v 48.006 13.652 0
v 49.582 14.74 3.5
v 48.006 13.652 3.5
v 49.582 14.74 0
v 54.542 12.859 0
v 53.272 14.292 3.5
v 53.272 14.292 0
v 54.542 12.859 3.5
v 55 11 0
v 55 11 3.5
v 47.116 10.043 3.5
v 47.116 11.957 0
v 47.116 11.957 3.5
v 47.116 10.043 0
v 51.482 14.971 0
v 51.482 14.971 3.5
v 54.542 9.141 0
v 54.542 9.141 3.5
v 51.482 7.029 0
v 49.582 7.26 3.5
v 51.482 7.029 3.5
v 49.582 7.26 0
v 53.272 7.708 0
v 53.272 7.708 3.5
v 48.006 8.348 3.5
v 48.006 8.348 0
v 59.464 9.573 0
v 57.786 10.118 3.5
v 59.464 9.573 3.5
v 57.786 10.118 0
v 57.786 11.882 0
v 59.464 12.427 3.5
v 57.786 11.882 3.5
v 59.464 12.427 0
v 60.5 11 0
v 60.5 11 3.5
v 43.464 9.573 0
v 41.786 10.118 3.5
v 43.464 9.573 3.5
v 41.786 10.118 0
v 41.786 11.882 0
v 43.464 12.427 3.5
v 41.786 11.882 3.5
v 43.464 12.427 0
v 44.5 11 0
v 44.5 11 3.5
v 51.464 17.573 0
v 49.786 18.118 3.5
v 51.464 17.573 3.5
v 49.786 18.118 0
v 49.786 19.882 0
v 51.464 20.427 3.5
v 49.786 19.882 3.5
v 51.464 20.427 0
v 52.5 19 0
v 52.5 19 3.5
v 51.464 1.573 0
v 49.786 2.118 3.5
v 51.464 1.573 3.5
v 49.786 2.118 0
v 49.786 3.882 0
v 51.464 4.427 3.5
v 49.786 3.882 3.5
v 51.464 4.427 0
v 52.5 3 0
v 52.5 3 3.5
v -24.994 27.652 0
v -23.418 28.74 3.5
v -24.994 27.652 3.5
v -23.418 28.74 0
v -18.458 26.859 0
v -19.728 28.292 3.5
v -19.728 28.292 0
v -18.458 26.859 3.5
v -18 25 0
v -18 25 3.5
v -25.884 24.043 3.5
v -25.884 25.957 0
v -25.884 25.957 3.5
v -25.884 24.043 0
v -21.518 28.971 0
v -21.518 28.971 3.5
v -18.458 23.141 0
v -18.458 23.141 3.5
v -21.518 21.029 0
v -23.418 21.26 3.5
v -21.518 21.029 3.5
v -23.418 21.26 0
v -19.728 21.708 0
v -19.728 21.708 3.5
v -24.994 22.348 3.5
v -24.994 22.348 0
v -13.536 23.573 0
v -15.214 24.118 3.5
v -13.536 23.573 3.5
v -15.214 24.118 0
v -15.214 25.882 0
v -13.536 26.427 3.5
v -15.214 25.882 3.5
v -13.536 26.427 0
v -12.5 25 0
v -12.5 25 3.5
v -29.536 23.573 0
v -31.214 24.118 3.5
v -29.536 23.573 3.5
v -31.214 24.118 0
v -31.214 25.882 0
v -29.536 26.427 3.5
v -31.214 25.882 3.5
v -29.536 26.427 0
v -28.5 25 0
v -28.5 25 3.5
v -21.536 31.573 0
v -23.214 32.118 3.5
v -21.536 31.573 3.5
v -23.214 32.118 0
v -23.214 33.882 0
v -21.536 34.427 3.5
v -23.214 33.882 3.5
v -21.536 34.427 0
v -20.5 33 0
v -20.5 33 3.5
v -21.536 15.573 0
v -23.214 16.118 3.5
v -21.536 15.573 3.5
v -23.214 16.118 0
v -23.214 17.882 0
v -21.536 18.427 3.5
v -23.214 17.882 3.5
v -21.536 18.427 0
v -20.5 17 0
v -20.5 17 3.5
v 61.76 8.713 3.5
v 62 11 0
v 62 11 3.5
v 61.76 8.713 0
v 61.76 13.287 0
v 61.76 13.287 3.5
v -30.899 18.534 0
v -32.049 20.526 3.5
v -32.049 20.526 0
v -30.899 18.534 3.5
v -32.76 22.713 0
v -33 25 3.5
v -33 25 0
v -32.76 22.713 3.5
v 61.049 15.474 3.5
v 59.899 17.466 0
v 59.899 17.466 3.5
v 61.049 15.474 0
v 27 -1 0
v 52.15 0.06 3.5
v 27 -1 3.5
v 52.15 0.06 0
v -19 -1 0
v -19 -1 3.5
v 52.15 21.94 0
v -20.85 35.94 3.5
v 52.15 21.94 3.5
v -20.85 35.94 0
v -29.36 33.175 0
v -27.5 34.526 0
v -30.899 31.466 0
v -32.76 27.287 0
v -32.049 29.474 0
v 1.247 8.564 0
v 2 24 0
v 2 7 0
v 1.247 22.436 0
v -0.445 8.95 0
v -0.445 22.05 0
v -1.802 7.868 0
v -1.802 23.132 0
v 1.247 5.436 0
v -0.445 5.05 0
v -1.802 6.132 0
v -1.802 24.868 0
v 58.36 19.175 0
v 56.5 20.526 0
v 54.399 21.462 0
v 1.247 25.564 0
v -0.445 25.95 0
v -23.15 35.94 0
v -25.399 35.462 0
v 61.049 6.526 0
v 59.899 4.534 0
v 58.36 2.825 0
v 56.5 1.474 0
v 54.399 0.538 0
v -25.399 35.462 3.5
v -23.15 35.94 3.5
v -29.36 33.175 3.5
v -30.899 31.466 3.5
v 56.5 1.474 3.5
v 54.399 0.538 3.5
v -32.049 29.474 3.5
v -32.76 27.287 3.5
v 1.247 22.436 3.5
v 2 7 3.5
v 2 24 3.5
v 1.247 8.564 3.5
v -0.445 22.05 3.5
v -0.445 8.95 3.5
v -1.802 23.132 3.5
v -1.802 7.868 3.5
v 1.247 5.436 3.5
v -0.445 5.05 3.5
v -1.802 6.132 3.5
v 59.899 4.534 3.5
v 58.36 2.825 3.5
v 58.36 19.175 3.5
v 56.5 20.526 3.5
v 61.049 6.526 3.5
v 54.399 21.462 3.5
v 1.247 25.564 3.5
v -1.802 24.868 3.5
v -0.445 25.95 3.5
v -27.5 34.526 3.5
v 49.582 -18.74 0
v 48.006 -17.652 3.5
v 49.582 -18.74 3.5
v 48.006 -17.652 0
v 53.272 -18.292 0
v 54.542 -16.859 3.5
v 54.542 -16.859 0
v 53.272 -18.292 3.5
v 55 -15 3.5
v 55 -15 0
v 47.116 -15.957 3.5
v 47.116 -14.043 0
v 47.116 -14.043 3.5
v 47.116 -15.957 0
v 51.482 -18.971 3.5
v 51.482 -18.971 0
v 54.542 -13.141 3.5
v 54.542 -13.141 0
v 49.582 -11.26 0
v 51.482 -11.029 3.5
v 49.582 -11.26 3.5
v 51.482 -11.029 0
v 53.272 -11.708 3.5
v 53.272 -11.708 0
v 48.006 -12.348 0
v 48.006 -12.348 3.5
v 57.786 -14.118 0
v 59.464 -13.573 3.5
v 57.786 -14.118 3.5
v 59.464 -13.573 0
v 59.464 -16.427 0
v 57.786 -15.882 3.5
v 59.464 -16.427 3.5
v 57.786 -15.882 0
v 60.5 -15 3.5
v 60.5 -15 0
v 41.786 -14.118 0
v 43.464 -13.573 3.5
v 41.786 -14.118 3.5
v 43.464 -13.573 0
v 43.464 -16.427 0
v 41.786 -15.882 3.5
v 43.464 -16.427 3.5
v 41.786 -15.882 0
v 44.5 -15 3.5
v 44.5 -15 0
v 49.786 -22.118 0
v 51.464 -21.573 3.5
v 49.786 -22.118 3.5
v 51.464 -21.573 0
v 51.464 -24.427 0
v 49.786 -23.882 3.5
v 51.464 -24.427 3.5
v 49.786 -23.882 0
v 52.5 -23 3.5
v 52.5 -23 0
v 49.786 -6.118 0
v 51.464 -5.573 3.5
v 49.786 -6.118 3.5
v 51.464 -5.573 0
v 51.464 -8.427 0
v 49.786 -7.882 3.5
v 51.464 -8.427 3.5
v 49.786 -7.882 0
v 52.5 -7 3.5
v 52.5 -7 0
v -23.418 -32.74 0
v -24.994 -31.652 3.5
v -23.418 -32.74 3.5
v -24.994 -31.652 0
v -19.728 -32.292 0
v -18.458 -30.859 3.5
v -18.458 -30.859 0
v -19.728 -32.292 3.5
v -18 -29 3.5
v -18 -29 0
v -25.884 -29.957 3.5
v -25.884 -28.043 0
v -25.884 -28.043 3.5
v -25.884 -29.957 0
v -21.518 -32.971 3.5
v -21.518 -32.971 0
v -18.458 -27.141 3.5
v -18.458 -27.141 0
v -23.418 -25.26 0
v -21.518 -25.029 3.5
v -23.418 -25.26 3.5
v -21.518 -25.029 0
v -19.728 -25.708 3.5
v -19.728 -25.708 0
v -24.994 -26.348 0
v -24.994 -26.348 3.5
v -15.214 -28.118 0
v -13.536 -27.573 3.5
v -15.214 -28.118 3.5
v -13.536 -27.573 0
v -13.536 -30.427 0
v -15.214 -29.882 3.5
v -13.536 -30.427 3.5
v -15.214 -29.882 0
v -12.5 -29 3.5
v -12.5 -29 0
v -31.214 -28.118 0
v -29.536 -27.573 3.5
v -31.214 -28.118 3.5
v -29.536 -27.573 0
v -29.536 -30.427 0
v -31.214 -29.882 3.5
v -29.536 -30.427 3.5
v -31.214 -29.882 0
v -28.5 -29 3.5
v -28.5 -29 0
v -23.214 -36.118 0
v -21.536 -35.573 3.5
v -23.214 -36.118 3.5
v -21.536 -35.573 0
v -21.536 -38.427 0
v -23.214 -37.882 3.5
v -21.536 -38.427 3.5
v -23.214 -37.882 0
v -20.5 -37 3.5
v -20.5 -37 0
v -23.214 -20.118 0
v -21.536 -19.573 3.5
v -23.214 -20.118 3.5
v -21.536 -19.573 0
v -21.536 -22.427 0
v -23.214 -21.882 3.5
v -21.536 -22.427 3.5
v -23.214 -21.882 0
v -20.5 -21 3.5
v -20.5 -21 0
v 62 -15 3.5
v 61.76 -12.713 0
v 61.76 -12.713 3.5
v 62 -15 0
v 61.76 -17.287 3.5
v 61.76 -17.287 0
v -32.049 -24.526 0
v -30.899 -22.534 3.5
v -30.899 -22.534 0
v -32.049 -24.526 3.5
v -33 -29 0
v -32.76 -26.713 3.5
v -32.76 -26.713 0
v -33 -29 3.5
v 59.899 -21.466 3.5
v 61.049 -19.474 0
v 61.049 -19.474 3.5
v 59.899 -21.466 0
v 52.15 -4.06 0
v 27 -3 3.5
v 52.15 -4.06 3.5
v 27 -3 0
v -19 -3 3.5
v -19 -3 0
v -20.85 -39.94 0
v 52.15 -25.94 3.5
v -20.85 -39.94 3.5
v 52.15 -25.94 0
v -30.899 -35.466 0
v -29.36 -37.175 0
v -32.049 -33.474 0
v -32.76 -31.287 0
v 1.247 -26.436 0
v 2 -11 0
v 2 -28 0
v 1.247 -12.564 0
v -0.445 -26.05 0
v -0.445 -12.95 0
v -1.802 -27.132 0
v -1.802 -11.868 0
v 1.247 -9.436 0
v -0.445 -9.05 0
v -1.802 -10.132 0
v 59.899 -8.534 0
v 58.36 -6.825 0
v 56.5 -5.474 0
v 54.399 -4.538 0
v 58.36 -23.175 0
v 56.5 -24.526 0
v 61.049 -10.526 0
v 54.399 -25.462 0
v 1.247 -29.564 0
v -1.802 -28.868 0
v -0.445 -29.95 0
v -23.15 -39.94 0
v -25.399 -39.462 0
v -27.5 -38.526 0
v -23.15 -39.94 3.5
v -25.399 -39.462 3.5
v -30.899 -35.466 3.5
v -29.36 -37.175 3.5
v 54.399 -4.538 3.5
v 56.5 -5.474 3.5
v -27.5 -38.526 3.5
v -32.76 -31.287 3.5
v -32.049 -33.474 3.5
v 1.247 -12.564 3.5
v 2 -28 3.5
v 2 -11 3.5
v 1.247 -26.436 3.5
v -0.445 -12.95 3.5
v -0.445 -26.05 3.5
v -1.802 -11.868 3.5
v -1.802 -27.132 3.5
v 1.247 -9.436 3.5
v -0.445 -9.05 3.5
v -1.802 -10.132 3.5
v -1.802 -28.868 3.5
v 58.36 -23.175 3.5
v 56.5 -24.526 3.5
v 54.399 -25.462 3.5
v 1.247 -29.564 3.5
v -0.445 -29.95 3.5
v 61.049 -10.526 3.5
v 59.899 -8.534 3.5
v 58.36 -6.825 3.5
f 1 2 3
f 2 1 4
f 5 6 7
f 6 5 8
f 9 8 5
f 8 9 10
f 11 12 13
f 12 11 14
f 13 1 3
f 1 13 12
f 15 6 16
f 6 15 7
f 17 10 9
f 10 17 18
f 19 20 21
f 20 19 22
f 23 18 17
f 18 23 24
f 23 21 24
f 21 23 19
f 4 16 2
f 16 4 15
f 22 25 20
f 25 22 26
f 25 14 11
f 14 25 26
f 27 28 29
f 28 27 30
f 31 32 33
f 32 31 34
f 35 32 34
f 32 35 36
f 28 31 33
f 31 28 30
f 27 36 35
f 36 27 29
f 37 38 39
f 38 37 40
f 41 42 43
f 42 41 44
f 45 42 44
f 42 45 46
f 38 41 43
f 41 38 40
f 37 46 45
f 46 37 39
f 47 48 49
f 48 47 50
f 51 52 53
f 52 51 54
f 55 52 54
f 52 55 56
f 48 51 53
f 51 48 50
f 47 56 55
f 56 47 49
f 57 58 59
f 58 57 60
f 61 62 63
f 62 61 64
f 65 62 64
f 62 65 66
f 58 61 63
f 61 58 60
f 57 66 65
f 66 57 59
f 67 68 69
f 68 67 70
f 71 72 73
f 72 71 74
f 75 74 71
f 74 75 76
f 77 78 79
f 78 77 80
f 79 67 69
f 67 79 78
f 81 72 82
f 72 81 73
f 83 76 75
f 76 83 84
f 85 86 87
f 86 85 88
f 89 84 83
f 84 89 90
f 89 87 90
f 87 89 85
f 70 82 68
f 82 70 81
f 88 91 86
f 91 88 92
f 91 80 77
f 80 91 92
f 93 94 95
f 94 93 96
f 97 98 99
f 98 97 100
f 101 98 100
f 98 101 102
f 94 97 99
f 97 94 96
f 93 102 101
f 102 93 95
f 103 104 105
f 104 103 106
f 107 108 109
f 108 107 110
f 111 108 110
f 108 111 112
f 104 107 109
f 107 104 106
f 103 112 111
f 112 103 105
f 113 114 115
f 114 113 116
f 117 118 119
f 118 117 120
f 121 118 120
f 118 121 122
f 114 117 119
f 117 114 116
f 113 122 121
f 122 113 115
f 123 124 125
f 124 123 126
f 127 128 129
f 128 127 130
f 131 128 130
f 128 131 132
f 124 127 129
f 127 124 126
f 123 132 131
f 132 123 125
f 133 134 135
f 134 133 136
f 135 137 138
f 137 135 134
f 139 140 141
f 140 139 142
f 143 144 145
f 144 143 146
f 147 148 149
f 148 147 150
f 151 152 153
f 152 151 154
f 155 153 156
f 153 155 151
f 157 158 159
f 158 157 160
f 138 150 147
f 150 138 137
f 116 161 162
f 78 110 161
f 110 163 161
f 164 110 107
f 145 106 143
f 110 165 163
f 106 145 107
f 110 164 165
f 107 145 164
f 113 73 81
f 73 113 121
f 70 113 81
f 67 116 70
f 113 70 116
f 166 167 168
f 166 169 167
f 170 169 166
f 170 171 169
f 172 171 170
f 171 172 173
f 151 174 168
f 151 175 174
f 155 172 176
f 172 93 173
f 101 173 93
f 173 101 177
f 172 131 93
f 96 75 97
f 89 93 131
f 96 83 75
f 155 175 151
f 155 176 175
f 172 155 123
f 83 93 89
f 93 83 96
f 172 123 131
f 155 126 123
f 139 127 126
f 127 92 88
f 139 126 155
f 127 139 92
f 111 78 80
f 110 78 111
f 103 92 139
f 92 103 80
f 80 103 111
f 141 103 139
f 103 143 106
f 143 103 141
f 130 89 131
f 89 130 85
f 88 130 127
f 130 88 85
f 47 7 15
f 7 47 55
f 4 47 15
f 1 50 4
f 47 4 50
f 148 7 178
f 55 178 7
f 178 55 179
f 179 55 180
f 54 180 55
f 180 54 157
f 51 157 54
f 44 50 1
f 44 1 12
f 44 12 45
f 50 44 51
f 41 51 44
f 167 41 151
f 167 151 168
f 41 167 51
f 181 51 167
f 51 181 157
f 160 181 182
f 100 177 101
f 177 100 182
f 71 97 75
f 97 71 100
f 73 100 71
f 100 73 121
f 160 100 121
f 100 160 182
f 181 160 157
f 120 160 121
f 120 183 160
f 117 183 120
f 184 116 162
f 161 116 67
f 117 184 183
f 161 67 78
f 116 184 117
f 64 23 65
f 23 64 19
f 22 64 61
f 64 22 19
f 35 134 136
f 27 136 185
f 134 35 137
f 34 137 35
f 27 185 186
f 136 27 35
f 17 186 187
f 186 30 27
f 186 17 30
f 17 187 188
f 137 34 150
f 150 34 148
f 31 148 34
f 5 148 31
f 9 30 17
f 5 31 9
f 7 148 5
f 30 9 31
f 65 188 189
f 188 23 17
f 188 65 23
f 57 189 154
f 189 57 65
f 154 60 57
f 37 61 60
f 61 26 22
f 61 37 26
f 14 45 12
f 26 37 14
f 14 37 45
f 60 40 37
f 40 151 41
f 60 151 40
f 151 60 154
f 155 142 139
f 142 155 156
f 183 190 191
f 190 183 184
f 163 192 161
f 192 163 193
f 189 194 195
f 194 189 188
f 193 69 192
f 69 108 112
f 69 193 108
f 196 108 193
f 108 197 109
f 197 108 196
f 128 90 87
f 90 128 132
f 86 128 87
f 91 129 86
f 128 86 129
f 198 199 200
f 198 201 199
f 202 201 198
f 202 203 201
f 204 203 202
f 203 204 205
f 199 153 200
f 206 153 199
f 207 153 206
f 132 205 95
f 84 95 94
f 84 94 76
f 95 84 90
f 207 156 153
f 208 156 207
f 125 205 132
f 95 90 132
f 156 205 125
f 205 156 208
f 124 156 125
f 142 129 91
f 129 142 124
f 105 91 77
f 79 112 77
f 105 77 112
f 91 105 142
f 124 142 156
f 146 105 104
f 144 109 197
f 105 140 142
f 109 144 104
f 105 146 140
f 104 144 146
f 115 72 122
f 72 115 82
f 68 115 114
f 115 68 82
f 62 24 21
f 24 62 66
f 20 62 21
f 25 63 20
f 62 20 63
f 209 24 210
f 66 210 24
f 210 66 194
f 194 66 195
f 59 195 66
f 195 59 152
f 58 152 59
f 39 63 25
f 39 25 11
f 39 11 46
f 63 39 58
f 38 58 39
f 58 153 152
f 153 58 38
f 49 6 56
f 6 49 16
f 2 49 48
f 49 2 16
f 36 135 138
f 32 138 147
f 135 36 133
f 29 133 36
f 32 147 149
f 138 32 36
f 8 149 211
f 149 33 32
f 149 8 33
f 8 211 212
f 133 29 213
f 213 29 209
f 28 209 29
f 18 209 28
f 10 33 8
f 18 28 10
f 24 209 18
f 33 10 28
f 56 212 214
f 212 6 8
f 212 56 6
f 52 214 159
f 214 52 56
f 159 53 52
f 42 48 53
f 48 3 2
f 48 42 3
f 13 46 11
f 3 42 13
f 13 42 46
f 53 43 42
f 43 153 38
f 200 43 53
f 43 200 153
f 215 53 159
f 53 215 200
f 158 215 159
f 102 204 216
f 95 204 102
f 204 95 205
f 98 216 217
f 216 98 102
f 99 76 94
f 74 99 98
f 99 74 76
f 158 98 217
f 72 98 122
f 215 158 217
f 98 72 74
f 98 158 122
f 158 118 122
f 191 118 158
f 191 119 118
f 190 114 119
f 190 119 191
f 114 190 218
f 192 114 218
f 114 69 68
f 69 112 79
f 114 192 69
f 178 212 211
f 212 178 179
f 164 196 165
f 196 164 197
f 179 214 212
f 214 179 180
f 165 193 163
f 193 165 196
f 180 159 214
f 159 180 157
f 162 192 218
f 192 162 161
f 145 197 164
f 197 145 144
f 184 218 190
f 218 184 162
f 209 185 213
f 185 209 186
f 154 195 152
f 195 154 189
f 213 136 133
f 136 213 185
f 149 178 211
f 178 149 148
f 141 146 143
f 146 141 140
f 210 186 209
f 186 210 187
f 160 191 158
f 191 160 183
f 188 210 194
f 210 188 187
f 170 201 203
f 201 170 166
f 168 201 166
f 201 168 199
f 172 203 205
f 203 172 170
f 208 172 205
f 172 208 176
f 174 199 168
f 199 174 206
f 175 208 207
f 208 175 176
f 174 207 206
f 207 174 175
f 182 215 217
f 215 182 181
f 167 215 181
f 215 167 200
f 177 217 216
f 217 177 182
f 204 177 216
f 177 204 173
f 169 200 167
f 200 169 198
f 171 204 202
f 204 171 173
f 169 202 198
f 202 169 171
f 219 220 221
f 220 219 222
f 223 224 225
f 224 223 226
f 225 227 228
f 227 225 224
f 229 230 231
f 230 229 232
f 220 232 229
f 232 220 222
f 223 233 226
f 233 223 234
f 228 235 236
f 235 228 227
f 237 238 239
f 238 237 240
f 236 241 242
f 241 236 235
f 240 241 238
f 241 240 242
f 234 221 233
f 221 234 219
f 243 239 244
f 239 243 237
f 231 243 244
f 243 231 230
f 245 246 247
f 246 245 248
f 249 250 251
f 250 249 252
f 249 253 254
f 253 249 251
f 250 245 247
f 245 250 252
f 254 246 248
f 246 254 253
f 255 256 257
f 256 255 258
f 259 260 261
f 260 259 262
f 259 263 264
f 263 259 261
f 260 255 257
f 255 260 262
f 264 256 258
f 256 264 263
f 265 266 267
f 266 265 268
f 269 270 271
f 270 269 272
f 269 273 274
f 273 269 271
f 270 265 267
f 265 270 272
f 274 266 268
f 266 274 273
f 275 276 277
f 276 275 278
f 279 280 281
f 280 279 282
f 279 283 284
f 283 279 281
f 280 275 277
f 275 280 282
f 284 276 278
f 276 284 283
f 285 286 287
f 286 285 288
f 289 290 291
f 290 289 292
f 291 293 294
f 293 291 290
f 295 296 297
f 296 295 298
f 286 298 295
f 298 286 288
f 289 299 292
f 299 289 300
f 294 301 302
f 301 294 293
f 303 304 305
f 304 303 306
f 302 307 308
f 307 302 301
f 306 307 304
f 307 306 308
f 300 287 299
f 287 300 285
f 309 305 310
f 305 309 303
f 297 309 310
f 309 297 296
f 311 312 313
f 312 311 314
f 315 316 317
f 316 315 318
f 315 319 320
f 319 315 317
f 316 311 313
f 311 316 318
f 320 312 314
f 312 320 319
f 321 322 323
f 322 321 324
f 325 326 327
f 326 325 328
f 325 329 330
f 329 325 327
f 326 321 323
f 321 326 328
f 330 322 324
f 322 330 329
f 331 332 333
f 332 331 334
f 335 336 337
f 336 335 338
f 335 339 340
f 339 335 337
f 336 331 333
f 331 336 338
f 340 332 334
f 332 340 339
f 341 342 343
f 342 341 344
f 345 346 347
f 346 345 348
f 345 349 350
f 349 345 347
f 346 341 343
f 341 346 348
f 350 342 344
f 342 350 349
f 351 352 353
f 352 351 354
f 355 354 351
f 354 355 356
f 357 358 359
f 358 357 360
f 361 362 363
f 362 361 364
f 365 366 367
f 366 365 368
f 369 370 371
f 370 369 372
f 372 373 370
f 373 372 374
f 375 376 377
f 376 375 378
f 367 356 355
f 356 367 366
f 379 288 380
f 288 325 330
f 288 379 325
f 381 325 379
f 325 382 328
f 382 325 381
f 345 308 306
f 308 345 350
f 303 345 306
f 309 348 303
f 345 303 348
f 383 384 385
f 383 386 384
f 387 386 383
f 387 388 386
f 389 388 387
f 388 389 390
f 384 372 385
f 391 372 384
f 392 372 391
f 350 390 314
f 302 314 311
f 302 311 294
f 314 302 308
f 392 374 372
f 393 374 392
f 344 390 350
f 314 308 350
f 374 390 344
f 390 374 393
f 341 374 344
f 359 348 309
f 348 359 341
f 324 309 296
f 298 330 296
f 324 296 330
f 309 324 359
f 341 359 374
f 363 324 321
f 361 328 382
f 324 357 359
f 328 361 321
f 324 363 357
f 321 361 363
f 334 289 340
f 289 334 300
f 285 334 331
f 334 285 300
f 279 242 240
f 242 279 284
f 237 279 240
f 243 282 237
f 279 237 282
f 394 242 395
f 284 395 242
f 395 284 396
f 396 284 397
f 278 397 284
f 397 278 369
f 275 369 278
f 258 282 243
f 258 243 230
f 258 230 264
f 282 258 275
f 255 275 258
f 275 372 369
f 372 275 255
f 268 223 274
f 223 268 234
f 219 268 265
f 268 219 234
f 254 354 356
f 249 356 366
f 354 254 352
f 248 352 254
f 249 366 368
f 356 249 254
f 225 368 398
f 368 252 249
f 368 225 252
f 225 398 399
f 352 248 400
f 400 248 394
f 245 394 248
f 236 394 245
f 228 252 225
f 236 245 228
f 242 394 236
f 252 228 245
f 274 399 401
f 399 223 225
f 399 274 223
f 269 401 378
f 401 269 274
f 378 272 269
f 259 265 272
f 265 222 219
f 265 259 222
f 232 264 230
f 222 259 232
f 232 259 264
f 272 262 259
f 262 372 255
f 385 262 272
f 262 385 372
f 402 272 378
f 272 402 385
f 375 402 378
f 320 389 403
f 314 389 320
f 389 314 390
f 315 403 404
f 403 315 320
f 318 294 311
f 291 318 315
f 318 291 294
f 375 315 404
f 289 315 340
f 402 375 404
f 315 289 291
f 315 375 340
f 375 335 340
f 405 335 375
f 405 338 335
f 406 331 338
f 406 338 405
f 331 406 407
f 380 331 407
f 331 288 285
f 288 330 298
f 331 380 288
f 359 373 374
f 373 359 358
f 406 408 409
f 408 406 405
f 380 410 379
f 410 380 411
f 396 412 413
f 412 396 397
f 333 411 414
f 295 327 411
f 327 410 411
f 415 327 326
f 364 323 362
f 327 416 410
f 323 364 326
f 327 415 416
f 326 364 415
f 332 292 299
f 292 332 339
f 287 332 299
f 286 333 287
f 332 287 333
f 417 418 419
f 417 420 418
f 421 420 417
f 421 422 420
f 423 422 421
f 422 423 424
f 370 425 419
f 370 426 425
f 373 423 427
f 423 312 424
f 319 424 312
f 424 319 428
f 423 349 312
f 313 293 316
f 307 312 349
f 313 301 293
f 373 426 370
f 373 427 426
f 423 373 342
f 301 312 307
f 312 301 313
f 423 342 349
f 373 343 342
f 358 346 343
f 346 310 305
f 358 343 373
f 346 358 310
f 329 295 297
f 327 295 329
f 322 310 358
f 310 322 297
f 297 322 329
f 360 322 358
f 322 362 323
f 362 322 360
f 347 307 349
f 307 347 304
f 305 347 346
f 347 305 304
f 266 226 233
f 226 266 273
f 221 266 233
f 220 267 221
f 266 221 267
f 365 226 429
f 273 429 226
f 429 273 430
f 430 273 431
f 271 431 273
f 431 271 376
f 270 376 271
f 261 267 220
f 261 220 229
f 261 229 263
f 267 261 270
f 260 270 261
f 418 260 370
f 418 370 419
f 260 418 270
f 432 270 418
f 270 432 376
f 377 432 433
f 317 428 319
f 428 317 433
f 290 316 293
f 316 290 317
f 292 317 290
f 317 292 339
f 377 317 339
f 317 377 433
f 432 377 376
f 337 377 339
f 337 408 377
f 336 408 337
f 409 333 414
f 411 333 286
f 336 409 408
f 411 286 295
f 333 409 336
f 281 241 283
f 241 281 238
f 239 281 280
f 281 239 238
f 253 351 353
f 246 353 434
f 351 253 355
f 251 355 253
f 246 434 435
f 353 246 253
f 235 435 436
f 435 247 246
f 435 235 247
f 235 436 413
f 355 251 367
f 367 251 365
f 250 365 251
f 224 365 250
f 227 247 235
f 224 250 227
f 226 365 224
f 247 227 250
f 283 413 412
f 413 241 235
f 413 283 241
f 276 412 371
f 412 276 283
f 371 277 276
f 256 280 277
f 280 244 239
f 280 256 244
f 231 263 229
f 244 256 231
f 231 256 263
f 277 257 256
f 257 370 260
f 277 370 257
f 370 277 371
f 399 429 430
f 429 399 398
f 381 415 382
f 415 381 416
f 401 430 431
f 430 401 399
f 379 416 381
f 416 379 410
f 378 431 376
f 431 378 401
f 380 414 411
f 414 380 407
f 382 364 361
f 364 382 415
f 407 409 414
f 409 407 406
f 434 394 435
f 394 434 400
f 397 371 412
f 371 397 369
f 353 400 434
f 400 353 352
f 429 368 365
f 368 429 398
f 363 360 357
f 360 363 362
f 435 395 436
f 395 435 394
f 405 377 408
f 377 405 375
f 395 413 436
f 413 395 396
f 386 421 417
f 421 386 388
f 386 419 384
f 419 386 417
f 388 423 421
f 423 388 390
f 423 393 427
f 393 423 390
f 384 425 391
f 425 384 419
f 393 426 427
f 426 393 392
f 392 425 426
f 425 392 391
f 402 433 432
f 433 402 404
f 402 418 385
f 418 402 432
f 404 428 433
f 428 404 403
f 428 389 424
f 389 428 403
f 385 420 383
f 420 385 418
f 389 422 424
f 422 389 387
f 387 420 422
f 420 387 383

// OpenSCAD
// file: raid3r/raid3r.scad
/*Pequeña biblioteca con las funciones mas comunes*/

module agujereado(X,Y,H){
	union(){
		for(j=[0:X-1])
		{
			translate([0,j*8,0])
			{
				for(i=[0:Y-1])
				{
					translate([i*6,0,-1])cylinder(r=1.2, h=H, $fn=10);
				}
			}
		}
	}
}

module dynahole(H){
	translate([-45.5/2,-10,1])union(){
		translate([3.5+6,16,0])agujereado(4,1,H);
		translate([9.5+26.5,16,0])agujereado(4,1,H);
		translate([45.5/2,10,-1])cylinder(r=11.5,h=H);	
		translate([(45.5-20)/2,6.5,-1])cube([20,36,H]);
		translate([22.5,46,0])union(){
			translate([7,0,-1])cylinder(r=1.5, h=H, $fn=10);
			translate([-7,0,-1])cylinder(r=1.5, h=H, $fn=10);
		}
	}
}

module cruz(H){
	translate([-34,-13,3])union(){
		translate([34,13,-3]) cylinder(r=4,h=H);
		translate([42,13,-3]) cylinder(r=1.5,h=H);
		translate([26,13,-3]) cylinder(r=1.5,h=H);
		translate([34,21,-3]) cylinder(r=1.5,h=H);
		translate([34,5,-3]) cylinder(r=1.5,h=H);
	}
}

module miniservo(H){
	translate([-15,-7,0])union(){
		translate([15,7,0])rotate([0,0,0])cylinder(r=8,h=H);
		translate([-1.75,7,0])union(){
			cylinder(r=1.5, h=H,$fn=20);
			translate([27.5,0,0])cylinder(r=1.5, h=H,$fn=20);
		}
	}
}
// main file
use <raid3r/raid3r.scad>


module pata(){difference(){
hull(){
translate([51,11,0])cylinder(r=11, h=3.5);
translate([-22,11+14,0])cylinder(r=11, h=3.5);
translate([-19,-1,0])cube([46,24,3.5]);
}
translate([51,11,-1])cruz(8);
translate([-22,11+14,-1])cruz(8);
translate([0,7,-1])cylinder(r=2, h=5);
translate([0,24,-1])cylinder(r=2, h=5);
}
}

pata();
translate([0,-4,0])mirror([0,1,0]) pata();
